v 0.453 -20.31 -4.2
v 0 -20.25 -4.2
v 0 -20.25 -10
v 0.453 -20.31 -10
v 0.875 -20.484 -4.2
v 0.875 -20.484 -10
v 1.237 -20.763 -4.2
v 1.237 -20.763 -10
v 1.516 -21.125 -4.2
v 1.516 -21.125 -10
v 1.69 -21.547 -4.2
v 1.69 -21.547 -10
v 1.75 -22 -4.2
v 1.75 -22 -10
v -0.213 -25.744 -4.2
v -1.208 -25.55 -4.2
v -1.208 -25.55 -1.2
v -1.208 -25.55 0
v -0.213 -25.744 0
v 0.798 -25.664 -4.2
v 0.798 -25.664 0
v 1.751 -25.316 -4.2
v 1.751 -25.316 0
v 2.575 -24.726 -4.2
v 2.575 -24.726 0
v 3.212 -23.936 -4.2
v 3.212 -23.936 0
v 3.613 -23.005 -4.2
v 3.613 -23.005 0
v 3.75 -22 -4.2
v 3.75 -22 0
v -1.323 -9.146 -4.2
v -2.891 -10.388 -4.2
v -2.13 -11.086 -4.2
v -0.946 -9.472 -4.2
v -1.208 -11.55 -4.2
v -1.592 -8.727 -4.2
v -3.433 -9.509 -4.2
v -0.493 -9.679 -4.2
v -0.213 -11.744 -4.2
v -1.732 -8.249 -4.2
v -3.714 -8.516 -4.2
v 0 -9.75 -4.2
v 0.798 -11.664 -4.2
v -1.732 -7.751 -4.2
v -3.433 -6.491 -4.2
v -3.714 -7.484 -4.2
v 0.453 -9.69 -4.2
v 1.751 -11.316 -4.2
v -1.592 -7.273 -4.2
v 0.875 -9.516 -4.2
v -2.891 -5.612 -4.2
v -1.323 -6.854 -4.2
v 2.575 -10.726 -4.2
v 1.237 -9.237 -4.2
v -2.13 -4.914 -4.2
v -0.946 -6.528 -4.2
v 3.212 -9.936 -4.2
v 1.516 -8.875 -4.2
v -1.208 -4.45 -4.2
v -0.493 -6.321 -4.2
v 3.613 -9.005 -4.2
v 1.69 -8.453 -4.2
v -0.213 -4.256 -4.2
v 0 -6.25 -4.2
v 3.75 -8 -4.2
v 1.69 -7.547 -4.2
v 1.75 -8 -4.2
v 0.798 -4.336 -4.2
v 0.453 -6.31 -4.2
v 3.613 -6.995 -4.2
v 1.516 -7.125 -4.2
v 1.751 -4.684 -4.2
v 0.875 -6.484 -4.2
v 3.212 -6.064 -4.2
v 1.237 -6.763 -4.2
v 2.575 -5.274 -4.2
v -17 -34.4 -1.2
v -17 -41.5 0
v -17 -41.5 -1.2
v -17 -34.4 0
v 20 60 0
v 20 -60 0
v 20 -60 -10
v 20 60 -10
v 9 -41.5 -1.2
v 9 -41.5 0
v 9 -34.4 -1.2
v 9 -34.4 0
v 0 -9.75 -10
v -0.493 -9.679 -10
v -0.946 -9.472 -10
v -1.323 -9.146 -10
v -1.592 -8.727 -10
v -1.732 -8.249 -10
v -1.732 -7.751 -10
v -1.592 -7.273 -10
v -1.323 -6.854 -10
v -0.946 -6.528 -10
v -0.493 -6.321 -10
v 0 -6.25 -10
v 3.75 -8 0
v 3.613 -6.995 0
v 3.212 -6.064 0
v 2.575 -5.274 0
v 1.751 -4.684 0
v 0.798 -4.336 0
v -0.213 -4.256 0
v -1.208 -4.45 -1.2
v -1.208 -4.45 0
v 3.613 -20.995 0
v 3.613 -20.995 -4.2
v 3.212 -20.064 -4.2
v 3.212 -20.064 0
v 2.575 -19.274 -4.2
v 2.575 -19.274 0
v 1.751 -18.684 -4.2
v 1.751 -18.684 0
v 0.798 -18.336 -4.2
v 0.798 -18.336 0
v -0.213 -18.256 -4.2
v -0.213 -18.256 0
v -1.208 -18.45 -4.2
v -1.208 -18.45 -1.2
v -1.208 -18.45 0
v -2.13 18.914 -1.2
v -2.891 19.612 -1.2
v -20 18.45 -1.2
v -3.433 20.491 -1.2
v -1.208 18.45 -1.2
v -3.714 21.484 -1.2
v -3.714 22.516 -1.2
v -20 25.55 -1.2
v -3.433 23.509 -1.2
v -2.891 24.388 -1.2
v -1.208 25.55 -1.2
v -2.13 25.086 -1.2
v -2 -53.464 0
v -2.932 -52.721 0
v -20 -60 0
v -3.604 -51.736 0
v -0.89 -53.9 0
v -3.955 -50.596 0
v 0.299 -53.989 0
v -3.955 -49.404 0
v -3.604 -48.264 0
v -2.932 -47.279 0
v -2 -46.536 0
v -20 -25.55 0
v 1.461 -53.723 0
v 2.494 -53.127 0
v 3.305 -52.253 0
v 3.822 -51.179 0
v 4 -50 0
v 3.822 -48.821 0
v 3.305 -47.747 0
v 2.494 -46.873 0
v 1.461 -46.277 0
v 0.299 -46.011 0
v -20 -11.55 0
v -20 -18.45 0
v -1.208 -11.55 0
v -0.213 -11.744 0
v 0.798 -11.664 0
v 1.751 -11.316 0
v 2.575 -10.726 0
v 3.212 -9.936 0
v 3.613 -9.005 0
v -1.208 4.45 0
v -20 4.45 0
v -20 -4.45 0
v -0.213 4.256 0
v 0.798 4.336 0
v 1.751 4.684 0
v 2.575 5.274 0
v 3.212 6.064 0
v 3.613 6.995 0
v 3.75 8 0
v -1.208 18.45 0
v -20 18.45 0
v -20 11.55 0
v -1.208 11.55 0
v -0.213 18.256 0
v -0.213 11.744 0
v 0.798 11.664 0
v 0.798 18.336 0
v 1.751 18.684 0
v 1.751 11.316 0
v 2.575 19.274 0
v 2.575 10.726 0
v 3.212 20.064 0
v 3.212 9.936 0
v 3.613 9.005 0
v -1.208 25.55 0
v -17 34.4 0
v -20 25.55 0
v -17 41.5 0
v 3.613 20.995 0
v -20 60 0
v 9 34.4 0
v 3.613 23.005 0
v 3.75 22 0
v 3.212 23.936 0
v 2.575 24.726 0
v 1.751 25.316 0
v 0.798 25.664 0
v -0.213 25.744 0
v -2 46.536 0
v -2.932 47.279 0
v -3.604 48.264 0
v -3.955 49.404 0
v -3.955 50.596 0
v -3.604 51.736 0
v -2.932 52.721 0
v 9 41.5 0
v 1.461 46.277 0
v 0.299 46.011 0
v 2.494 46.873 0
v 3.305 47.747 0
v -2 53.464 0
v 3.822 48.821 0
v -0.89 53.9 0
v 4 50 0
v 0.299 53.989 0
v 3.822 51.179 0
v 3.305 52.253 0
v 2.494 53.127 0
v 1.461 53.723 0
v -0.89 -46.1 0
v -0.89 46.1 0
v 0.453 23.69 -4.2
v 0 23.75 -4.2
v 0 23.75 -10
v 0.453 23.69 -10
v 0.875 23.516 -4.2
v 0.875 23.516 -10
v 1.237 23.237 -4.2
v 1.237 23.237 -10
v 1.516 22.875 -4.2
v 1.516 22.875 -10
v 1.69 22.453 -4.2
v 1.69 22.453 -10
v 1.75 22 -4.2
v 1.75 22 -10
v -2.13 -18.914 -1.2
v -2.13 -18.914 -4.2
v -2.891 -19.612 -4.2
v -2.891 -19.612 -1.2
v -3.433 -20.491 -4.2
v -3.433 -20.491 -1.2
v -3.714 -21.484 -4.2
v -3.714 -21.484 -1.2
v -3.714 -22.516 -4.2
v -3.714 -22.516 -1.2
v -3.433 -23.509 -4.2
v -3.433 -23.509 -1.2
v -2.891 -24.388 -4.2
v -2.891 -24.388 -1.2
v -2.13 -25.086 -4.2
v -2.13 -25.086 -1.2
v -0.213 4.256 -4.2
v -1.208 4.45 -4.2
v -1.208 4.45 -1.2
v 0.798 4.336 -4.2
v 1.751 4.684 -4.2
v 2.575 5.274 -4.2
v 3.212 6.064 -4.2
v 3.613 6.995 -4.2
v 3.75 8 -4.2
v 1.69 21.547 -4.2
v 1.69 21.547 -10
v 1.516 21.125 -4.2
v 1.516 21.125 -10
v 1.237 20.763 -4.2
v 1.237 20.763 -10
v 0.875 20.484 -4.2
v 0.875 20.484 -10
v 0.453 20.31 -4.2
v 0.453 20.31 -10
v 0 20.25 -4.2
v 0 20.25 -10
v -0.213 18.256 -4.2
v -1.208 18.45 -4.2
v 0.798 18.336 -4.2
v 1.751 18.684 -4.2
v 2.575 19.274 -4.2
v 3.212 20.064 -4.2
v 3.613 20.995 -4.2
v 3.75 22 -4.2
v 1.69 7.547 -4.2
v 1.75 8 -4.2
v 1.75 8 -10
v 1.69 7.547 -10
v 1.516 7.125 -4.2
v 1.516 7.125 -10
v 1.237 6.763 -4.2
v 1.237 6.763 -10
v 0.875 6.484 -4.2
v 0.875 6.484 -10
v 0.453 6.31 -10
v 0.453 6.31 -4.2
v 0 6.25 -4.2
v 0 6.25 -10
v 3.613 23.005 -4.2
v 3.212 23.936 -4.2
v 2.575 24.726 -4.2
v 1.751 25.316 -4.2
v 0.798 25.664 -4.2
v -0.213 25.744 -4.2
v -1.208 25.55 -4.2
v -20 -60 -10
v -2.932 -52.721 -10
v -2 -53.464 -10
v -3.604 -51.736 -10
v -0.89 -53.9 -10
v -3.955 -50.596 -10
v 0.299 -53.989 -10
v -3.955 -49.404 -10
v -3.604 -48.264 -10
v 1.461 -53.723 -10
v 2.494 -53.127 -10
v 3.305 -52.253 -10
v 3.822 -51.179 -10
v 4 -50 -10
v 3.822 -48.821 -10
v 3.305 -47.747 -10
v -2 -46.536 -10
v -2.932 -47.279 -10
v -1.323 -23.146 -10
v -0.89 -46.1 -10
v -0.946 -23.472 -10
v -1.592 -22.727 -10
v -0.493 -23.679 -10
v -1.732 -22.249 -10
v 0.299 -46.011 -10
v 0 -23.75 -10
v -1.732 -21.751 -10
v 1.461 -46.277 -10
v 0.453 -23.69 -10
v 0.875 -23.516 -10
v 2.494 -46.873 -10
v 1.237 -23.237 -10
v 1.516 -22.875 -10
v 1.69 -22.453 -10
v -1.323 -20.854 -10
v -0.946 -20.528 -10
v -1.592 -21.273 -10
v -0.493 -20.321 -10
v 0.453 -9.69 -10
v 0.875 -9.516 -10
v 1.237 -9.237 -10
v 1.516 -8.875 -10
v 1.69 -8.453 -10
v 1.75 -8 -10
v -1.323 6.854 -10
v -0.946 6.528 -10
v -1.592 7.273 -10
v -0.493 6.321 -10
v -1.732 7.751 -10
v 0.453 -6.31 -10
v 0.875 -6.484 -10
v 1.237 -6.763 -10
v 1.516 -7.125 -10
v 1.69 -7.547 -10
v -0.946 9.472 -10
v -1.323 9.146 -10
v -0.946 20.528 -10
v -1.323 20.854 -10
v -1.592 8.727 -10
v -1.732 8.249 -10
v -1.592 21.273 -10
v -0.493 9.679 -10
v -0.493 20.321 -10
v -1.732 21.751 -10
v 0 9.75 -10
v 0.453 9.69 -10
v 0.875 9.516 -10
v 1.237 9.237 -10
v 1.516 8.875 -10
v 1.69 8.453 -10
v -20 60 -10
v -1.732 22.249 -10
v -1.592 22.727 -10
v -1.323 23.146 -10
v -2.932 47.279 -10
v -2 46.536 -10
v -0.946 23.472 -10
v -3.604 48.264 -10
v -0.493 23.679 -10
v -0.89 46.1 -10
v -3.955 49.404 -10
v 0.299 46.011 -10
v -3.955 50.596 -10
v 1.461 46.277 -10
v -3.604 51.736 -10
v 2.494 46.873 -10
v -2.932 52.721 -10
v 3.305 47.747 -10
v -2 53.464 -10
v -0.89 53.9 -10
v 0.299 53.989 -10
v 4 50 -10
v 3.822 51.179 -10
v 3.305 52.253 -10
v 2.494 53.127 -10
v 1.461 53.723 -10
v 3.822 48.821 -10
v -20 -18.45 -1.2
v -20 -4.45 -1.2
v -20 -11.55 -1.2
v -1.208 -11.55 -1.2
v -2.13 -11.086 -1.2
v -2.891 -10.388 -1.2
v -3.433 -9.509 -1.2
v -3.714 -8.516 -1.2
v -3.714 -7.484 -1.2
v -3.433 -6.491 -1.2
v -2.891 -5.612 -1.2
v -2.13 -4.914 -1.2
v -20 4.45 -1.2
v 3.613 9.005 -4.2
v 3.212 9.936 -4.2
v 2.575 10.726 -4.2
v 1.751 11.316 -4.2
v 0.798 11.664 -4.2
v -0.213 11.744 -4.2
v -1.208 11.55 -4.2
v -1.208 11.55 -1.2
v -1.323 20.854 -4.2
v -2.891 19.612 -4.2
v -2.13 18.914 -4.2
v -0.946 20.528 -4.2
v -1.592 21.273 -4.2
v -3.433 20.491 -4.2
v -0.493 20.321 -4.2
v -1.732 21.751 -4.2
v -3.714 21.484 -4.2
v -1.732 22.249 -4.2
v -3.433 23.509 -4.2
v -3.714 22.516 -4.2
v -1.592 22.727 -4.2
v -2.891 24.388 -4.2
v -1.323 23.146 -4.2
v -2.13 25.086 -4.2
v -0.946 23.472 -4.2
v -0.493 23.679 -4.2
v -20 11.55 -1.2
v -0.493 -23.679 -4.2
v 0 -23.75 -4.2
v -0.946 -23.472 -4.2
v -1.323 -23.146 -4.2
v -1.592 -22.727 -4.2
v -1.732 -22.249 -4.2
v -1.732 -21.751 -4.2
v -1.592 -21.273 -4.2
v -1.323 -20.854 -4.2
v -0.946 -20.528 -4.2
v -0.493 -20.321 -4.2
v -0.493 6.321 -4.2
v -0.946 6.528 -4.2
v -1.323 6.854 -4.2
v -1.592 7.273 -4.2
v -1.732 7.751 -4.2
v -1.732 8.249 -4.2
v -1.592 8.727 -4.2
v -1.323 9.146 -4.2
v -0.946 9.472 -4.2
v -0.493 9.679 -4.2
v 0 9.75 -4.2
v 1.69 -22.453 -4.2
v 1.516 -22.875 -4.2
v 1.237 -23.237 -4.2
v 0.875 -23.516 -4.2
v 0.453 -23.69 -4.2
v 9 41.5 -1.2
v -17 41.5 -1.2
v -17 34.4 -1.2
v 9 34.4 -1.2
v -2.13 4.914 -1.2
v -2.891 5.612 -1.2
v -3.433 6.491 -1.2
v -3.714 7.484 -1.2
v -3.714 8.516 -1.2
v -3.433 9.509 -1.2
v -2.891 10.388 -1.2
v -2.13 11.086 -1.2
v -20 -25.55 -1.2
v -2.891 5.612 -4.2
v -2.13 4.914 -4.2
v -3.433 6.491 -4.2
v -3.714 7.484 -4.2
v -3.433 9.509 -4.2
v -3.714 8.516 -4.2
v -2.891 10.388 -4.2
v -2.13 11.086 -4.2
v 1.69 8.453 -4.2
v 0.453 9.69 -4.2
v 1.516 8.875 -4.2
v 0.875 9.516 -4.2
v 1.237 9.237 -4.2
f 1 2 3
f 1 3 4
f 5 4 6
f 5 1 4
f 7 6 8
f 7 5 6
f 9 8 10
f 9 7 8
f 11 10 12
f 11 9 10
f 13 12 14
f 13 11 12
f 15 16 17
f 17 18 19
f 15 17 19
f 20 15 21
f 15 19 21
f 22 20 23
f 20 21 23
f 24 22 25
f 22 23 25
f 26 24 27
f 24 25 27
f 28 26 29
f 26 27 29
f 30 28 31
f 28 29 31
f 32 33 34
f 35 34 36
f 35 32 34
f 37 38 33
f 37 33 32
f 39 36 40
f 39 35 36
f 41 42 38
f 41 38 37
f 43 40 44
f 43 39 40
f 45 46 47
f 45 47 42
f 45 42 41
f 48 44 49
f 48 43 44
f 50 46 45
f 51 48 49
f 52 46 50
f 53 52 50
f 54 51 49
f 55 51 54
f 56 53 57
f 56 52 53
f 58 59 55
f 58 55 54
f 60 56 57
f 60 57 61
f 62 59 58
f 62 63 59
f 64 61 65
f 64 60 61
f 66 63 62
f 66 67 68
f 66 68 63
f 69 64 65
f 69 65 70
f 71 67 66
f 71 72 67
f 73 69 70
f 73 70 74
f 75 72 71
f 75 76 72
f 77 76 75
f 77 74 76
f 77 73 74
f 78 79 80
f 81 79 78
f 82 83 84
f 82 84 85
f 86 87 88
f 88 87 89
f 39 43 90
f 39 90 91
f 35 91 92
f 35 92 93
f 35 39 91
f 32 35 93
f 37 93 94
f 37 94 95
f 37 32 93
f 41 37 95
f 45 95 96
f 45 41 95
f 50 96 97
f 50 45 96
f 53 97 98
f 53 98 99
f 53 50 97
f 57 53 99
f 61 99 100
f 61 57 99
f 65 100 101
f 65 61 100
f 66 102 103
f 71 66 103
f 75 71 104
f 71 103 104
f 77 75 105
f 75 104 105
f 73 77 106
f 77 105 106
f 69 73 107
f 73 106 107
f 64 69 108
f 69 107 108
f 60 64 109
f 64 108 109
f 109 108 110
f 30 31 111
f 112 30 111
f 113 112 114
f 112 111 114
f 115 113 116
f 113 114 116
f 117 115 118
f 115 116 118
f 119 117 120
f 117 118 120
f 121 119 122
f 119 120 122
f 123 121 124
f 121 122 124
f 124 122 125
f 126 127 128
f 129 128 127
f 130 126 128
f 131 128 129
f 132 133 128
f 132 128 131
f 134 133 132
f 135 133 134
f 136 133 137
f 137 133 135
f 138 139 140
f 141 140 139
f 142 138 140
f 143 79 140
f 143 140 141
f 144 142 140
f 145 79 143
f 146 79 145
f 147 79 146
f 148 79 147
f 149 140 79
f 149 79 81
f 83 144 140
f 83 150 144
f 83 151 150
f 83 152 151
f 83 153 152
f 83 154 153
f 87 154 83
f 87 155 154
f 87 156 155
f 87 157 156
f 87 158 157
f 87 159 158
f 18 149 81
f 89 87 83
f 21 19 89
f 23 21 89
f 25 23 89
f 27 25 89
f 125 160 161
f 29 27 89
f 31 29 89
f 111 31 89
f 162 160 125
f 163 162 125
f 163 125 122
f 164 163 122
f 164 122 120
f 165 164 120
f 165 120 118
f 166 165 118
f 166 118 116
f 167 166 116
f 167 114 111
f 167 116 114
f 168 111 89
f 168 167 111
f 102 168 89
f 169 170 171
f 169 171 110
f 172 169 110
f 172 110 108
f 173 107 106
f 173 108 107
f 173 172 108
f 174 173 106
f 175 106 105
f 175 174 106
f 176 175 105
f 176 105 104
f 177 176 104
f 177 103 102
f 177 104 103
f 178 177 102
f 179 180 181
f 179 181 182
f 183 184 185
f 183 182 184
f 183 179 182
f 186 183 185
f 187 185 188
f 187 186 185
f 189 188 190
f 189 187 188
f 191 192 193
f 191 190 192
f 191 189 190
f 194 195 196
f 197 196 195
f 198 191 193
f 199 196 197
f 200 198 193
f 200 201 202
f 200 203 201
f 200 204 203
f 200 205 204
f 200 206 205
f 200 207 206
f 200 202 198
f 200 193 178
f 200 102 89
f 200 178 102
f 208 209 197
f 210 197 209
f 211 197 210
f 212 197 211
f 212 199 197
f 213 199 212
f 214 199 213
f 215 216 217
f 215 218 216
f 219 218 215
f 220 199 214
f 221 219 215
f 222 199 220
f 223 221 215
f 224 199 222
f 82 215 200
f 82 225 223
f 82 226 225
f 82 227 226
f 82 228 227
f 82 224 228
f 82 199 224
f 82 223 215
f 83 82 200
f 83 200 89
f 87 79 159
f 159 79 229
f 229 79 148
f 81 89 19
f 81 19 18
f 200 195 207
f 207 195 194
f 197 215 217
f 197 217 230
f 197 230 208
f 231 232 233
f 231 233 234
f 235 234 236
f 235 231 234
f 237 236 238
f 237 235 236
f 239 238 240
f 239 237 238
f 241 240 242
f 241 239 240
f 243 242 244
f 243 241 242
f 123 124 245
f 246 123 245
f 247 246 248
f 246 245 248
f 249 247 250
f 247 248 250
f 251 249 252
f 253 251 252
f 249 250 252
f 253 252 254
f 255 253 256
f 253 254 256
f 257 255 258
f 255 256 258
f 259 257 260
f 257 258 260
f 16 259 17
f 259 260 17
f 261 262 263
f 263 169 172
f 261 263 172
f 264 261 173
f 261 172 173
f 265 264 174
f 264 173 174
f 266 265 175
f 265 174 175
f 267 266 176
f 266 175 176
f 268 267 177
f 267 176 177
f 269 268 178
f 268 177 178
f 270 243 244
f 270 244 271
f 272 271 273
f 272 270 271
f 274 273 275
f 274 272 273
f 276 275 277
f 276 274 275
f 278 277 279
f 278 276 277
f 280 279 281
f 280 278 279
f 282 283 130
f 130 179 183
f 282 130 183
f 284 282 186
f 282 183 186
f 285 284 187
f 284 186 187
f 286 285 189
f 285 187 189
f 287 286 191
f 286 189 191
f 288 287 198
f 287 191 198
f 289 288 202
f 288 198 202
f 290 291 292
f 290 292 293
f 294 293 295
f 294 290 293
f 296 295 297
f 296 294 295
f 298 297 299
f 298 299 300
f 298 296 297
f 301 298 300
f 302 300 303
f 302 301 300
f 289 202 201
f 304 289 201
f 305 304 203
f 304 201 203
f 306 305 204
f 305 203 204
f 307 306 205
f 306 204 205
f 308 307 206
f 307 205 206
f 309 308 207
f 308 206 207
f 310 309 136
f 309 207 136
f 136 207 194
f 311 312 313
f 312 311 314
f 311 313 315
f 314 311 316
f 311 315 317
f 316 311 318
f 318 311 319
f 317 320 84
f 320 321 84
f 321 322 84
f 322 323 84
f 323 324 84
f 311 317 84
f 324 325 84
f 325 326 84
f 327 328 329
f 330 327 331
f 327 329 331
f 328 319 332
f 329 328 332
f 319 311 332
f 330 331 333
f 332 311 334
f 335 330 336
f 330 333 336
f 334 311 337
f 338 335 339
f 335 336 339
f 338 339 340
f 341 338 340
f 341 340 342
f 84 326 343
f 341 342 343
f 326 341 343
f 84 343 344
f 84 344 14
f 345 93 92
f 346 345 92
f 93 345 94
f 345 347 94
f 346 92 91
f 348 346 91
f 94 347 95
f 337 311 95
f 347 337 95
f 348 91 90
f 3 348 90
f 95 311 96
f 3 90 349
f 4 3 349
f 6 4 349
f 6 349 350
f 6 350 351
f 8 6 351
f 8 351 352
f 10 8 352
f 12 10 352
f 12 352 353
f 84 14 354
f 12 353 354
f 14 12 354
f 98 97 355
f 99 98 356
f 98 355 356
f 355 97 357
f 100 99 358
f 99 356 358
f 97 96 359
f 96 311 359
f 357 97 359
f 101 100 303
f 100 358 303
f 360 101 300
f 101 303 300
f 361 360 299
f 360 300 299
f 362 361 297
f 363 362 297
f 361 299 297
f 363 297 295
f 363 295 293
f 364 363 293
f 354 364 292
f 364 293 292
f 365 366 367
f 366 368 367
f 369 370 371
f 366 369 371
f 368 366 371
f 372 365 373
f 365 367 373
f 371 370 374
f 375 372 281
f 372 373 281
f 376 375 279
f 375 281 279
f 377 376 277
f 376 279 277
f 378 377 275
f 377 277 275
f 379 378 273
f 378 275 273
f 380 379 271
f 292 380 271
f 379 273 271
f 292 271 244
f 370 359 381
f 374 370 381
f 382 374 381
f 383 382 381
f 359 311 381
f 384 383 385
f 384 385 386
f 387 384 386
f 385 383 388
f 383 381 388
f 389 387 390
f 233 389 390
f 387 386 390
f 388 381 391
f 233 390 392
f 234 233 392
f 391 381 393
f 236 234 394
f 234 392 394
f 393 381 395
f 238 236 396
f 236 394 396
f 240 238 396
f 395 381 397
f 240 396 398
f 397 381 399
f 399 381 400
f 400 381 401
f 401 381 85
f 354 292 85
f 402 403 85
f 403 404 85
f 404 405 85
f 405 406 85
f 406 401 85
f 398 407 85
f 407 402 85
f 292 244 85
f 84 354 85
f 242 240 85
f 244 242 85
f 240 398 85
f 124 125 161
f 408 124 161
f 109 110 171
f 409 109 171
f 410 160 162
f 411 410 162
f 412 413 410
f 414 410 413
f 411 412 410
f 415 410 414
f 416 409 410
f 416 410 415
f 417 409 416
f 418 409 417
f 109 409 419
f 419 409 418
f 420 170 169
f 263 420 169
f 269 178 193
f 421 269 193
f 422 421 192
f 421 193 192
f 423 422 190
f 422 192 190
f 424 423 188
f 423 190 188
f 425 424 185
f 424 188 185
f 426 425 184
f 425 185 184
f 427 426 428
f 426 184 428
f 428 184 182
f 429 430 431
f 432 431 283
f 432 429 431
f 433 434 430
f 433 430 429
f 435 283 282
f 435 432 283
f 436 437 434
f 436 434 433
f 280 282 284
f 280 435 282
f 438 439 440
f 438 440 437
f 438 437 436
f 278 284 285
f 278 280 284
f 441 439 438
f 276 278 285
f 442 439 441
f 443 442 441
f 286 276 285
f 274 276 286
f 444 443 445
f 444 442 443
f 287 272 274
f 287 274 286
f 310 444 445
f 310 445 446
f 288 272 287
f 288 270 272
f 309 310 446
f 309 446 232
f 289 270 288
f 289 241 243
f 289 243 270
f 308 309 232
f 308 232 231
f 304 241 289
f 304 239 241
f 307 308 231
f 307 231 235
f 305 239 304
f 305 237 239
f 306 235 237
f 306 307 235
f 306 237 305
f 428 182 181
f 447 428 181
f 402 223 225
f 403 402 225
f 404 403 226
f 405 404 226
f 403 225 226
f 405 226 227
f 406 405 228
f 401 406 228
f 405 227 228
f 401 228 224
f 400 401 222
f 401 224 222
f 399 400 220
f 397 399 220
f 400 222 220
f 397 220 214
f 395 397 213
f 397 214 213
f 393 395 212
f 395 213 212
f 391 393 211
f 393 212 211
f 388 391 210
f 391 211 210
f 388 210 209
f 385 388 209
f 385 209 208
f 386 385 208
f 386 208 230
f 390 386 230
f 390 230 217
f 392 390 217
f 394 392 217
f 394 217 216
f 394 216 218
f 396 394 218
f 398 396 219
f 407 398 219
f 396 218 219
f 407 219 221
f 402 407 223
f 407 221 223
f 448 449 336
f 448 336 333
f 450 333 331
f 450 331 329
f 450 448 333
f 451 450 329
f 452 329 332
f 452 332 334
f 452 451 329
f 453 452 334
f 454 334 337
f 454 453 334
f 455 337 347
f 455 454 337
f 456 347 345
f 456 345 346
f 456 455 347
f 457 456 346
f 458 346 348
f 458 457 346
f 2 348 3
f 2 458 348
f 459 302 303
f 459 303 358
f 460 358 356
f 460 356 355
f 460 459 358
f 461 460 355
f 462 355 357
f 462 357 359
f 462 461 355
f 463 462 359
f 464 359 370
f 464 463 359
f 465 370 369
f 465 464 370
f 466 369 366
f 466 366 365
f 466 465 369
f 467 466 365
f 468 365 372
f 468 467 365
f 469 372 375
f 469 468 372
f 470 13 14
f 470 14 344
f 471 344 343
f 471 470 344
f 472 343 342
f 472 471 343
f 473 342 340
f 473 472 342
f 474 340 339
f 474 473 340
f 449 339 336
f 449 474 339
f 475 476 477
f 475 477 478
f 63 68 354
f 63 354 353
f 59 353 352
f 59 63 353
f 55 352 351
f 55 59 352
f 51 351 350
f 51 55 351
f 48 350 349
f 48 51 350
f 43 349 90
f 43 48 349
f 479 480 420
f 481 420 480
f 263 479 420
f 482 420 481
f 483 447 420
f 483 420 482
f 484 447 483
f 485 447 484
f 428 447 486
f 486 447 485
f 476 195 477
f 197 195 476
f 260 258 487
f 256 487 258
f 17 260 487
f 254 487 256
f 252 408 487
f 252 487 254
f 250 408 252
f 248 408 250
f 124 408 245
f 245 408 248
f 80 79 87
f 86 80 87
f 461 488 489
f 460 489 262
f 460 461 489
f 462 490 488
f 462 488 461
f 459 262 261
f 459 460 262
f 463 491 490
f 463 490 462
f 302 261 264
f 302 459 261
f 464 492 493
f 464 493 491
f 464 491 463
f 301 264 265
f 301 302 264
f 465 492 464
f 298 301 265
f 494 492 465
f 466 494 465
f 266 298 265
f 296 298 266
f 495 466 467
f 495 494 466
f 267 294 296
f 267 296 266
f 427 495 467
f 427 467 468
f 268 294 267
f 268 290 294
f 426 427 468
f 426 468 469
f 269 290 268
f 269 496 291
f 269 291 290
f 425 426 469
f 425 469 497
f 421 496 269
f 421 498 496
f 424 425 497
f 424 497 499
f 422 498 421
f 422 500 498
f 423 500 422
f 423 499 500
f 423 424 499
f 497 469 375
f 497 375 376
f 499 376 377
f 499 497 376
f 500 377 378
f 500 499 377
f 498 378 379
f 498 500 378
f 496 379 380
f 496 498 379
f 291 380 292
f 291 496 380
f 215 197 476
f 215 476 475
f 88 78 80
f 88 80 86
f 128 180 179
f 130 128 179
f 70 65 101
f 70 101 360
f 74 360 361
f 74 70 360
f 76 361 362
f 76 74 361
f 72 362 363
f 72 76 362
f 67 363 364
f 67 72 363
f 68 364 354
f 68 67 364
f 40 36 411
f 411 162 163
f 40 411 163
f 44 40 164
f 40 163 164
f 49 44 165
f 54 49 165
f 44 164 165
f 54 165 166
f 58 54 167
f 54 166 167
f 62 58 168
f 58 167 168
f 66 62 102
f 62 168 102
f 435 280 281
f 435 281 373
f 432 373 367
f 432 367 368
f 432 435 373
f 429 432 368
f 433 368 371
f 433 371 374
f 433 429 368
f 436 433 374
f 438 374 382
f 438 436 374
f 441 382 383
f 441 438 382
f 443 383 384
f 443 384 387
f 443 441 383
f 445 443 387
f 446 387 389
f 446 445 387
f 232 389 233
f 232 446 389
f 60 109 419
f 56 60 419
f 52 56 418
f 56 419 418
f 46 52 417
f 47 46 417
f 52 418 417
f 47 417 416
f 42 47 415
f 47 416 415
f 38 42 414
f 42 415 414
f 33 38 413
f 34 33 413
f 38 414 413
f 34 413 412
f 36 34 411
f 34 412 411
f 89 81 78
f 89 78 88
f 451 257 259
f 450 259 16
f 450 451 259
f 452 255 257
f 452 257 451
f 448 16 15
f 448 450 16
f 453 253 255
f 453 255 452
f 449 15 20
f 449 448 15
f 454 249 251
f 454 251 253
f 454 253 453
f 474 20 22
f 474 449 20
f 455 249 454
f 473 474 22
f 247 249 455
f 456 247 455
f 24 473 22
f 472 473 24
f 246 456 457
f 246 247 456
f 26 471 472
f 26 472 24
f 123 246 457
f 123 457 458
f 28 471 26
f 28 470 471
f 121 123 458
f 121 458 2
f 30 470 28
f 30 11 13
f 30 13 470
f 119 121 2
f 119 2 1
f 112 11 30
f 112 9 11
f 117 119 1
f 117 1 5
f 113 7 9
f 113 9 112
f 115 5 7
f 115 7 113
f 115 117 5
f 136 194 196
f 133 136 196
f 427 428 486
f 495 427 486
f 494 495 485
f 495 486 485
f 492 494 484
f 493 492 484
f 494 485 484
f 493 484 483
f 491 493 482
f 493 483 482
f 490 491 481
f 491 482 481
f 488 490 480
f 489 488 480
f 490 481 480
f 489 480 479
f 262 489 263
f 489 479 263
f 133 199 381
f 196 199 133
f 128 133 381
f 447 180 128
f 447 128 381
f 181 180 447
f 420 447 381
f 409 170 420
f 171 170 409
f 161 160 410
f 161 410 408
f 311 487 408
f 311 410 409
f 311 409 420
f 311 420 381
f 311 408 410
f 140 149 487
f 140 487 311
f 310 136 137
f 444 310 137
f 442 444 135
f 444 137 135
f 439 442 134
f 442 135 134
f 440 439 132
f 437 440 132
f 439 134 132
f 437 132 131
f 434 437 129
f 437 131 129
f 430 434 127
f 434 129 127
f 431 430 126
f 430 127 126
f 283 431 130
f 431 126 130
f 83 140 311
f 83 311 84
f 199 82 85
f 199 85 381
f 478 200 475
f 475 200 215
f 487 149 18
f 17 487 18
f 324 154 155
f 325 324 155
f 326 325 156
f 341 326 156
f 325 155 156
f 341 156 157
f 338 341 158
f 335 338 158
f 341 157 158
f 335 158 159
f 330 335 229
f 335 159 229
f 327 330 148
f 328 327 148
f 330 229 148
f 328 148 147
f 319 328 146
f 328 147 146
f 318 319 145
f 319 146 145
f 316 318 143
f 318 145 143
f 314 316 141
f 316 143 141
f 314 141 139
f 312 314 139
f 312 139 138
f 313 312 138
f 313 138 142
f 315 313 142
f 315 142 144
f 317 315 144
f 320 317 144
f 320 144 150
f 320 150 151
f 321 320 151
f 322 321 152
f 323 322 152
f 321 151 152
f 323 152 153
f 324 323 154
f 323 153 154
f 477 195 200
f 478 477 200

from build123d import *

# Parameters (mm, degrees)
F0_W     = 26
F0_H     = 7.1
F0_R     = 4
F1_DEPTH = 10
F2_DEPTH = 1.2
F3_DEPTH = 4.2


# Not quite as in the source:
# - a feature names something its author has since deleted; it is built from what else it names


with BuildPart() as f1:
    # F0 (on Top) → F1 (new body)
    with BuildSketch(Plane.XY):
        with BuildLine():
            Line((-20, -60), (20, -60))
            Line((20, -60), (20, 60))
            Line((20, 60), (-20, 60))
            Line((-20, 60), (-20, 25.55))
            Line((-20, 25.55), (-1.2083045974, 25.55))
            ThreePointArc((-1.2083045974, 25.55), (2.1830434902, 25.0490688939), (3.75, 22))
            ThreePointArc((3.75, 22), (2.1830434902, 18.9509311061), (-1.2083045974, 18.45))
            Line((-1.2083045974, 18.45), (-20, 18.45))
            Line((-20, 18.45), (-20, 11.55))
            Line((-20, 11.55), (-1.2083045974, 11.55))
            ThreePointArc((-1.2083045974, 11.55), (2.1830434902, 11.0490688939), (3.75, 8))
            ThreePointArc((3.75, 8), (2.1830434902, 4.9509311061), (-1.2083045974, 4.45))
            Line((-1.2083045974, 4.45), (-20, 4.45))
            Line((-20, 4.45), (-20, -4.45))
            Line((-20, -4.45), (-1.2083045974, -4.45))
            ThreePointArc((-1.2083045974, -4.45), (2.1830434902, -4.9509311061), (3.75, -8))
            ThreePointArc((3.75, -8), (2.1830434902, -11.0490688939), (-1.2083045974, -11.55))
            Line((-1.2083045974, -11.55), (-20, -11.55))
            Line((-20, -11.55), (-20, -18.45))
            Line((-20, -18.45), (-1.2083045974, -18.45))
            ThreePointArc((-1.2083045974, -18.45), (2.1830434902, -18.9509311061), (3.75, -22))
            ThreePointArc((3.75, -22), (2.1830434902, -25.0490688939), (-1.2083045974, -25.55))
            Line((-1.2083045974, -25.55), (-20, -25.55))
            Line((-20, -25.55), (-20, -60))
        make_face()
        with Locations((-4, -37.95)):
            Rectangle(F0_W, F0_H, mode=Mode.SUBTRACT)
        with Locations((0, -50)):
            Circle(F0_R, mode=Mode.SUBTRACT)
        with Locations((-4, 37.95)):
            Rectangle(F0_W, F0_H, mode=Mode.SUBTRACT)
        with Locations((0, 50)):
            Circle(F0_R, mode=Mode.SUBTRACT)
        with BuildLine():
            Line((-20, -18.45), (-20, -25.55))
            Line((-20, -25.55), (-1.2083045974, -25.55))
            ThreePointArc((-1.2083045974, -25.55), (-3.75, -22), (-1.2083045974, -18.45))
            Line((-1.2083045974, -18.45), (-20, -18.45))
        make_face()
        with BuildLine():
            Line((-1.2083045974, 25.55), (-20, 25.55))
            Line((-20, 25.55), (-20, 18.45))
            Line((-20, 18.45), (-1.2083045974, 18.45))
            ThreePointArc((-1.2083045974, 18.45), (-3.75, 22), (-1.2083045974, 25.55))
        make_face()
        with BuildLine():
            Line((-20, -4.45), (-20, -11.55))
            Line((-20, -11.55), (-1.2083045974, -11.55))
            ThreePointArc((-1.2083045974, -11.55), (-3.75, -8), (-1.2083045974, -4.45))
            Line((-1.2083045974, -4.45), (-20, -4.45))
        make_face()
        with BuildLine():
            Line((-1.2083045974, 11.55), (-20, 11.55))
            Line((-20, 11.55), (-20, 4.45))
            Line((-20, 4.45), (-1.2083045974, 4.45))
            ThreePointArc((-1.2083045974, 4.45), (-3.75, 8), (-1.2083045974, 11.55))
        make_face()
        with BuildLine():
            Line((0, 25.55), (-1.2083045974, 25.55))
            ThreePointArc((-1.2083045974, 25.55), (-3.75, 22), (-1.2083045974, 18.45))
            Line((-1.2083045974, 18.45), (0, 18.45))
            Line((0, 18.45), (0, 20.25))
            ThreePointArc((0, 20.25), (-1.75, 22), (0, 23.75))
            Line((0, 23.75), (0, 25.55))
        make_face()
        with BuildLine():
            ThreePointArc((3.75, 22), (2.1830434902, 25.0490688939), (-1.2083045974, 25.55))
            Line((-1.2083045974, 25.55), (0, 25.55))
            Line((0, 25.55), (0, 23.75))
            ThreePointArc((0, 23.75), (1.2374368671, 23.2374368671), (1.75, 22))
            ThreePointArc((1.75, 22), (1.2374368671, 20.7625631329), (0, 20.25))
            Line((0, 20.25), (0, 18.45))
            Line((0, 18.45), (-1.2083045974, 18.45))
            ThreePointArc((-1.2083045974, 18.45), (2.1830434902, 18.9509311061), (3.75, 22))
        make_face()
        with BuildLine():
            ThreePointArc((3.75, 8), (2.1830434902, 11.0490688939), (-1.2083045974, 11.55))
            Line((-1.2083045974, 11.55), (0, 11.55))
            Line((0, 11.55), (0, 9.75))
            ThreePointArc((0, 9.75), (1.2374368671, 9.2374368671), (1.75, 8))
            ThreePointArc((1.75, 8), (1.2374368671, 6.7625631329), (0, 6.25))
            Line((0, 6.25), (0, 4.45))
            Line((0, 4.45), (-1.2083045974, 4.45))
            ThreePointArc((-1.2083045974, 4.45), (2.1830434902, 4.9509311061), (3.75, 8))
        make_face()
        with BuildLine():
            Line((0, 11.55), (-1.2083045974, 11.55))
            ThreePointArc((-1.2083045974, 11.55), (-3.75, 8), (-1.2083045974, 4.45))
            Line((-1.2083045974, 4.45), (0, 4.45))
            Line((0, 4.45), (0, 6.25))
            ThreePointArc((0, 6.25), (-1.75, 8), (0, 9.75))
            Line((0, 9.75), (0, 11.55))
        make_face()
        with BuildLine():
            ThreePointArc((-1.2083045974, -4.45), (-3.75, -8), (-1.2083045974, -11.55))
            Line((-1.2083045974, -11.55), (0, -11.55))
            Line((0, -11.55), (0, -9.75))
            ThreePointArc((0, -9.75), (-1.75, -8), (0, -6.25))
            Line((0, -6.25), (0, -4.45))
            Line((0, -4.45), (-1.2083045974, -4.45))
        make_face()
        with BuildLine():
            Line((0, -11.55), (-1.2083045974, -11.55))
            ThreePointArc((-1.2083045974, -11.55), (2.1830434902, -11.0490688939), (3.75, -8))
            ThreePointArc((3.75, -8), (2.1830434902, -4.9509311061), (-1.2083045974, -4.45))
            Line((-1.2083045974, -4.45), (0, -4.45))
            Line((0, -4.45), (0, -6.25))
            ThreePointArc((0, -6.25), (1.2374368671, -6.7625631329), (1.75, -8))
            ThreePointArc((1.75, -8), (1.2374368671, -9.2374368671), (0, -9.75))
            Line((0, -9.75), (0, -11.55))
        make_face()
        with BuildLine():
            Line((0, -25.55), (-1.2083045974, -25.55))
            ThreePointArc((-1.2083045974, -25.55), (2.1830434902, -25.0490688939), (3.75, -22))
            ThreePointArc((3.75, -22), (2.1830434902, -18.9509311061), (-1.2083045974, -18.45))
            Line((-1.2083045974, -18.45), (0, -18.45))
            Line((0, -18.45), (0, -20.25))
            ThreePointArc((0, -20.25), (1.2374368671, -20.7625631329), (1.75, -22))
            ThreePointArc((1.75, -22), (1.2374368671, -23.2374368671), (0, -23.75))
            Line((0, -23.75), (0, -25.55))
        make_face()
        with BuildLine():
            ThreePointArc((-1.2083045974, -18.45), (-3.75, -22), (-1.2083045974, -25.55))
            Line((-1.2083045974, -25.55), (0, -25.55))
            Line((0, -25.55), (0, -23.75))
            ThreePointArc((0, -23.75), (-1.75, -22), (0, -20.25))
            Line((0, -20.25), (0, -18.45))
            Line((0, -18.45), (-1.2083045974, -18.45))
        make_face()
        with Locations((-4, 37.95)):
            Rectangle(F0_W, F0_H)
        with Locations((-4, -37.95)):
            Rectangle(F0_W, F0_H)
    extrude(amount=-F1_DEPTH)

    # F0 (on Top) → F2 (cut)
    with BuildSketch(Plane.XY):
        with BuildLine():
            Line((-1.2083045974, 25.55), (-20, 25.55))
            Line((-20, 25.55), (-20, 18.45))
            Line((-20, 18.45), (-1.2083045974, 18.45))
            ThreePointArc((-1.2083045974, 18.45), (-3.75, 22), (-1.2083045974, 25.55))
        make_face()
        with BuildLine():
            Line((-1.2083045974, 11.55), (-20, 11.55))
            Line((-20, 11.55), (-20, 4.45))
            Line((-20, 4.45), (-1.2083045974, 4.45))
            ThreePointArc((-1.2083045974, 4.45), (-3.75, 8), (-1.2083045974, 11.55))
        make_face()
        with BuildLine():
            Line((-20, -4.45), (-20, -11.55))
            Line((-20, -11.55), (-1.2083045974, -11.55))
            ThreePointArc((-1.2083045974, -11.55), (-3.75, -8), (-1.2083045974, -4.45))
            Line((-1.2083045974, -4.45), (-20, -4.45))
        make_face()
        with BuildLine():
            Line((-20, -18.45), (-20, -25.55))
            Line((-20, -25.55), (-1.2083045974, -25.55))
            ThreePointArc((-1.2083045974, -25.55), (-3.75, -22), (-1.2083045974, -18.45))
            Line((-1.2083045974, -18.45), (-20, -18.45))
        make_face()
        with Locations((-4, 37.95)):
            Rectangle(F0_W, F0_H)
        with Locations((-4, -37.95)):
            Rectangle(F0_W, F0_H)
    extrude(amount=-F2_DEPTH, mode=Mode.SUBTRACT)

    # F0 (on Top) → F3 (cut)
    with BuildSketch(Plane.XY):
        with BuildLine():
            Line((0, 25.55), (-1.2083045974, 25.55))
            ThreePointArc((-1.2083045974, 25.55), (-3.75, 22), (-1.2083045974, 18.45))
            Line((-1.2083045974, 18.45), (0, 18.45))
            Line((0, 18.45), (0, 20.25))
            ThreePointArc((0, 20.25), (-1.75, 22), (0, 23.75))
            Line((0, 23.75), (0, 25.55))
        make_face()
        with BuildLine():
            ThreePointArc((3.75, 22), (2.1830434902, 25.0490688939), (-1.2083045974, 25.55))
            Line((-1.2083045974, 25.55), (0, 25.55))
            Line((0, 25.55), (0, 23.75))
            ThreePointArc((0, 23.75), (1.2374368671, 23.2374368671), (1.75, 22))
            ThreePointArc((1.75, 22), (1.2374368671, 20.7625631329), (0, 20.25))
            Line((0, 20.25), (0, 18.45))
            Line((0, 18.45), (-1.2083045974, 18.45))
            ThreePointArc((-1.2083045974, 18.45), (2.1830434902, 18.9509311061), (3.75, 22))
        make_face()
        with BuildLine():
            Line((0, 11.55), (-1.2083045974, 11.55))
            ThreePointArc((-1.2083045974, 11.55), (-3.75, 8), (-1.2083045974, 4.45))
            Line((-1.2083045974, 4.45), (0, 4.45))
            Line((0, 4.45), (0, 6.25))
            ThreePointArc((0, 6.25), (-1.75, 8), (0, 9.75))
            Line((0, 9.75), (0, 11.55))
        make_face()
        with BuildLine():
            ThreePointArc((3.75, 8), (2.1830434902, 11.0490688939), (-1.2083045974, 11.55))
            Line((-1.2083045974, 11.55), (0, 11.55))
            Line((0, 11.55), (0, 9.75))
            ThreePointArc((0, 9.75), (1.2374368671, 9.2374368671), (1.75, 8))
            ThreePointArc((1.75, 8), (1.2374368671, 6.7625631329), (0, 6.25))
            Line((0, 6.25), (0, 4.45))
            Line((0, 4.45), (-1.2083045974, 4.45))
            ThreePointArc((-1.2083045974, 4.45), (2.1830434902, 4.9509311061), (3.75, 8))
        make_face()
        with BuildLine():
            ThreePointArc((-1.2083045974, -4.45), (-3.75, -8), (-1.2083045974, -11.55))
            Line((-1.2083045974, -11.55), (0, -11.55))
            Line((0, -11.55), (0, -9.75))
            ThreePointArc((0, -9.75), (-1.75, -8), (0, -6.25))
            Line((0, -6.25), (0, -4.45))
            Line((0, -4.45), (-1.2083045974, -4.45))
        make_face()
        with BuildLine():
            Line((0, -11.55), (-1.2083045974, -11.55))
            ThreePointArc((-1.2083045974, -11.55), (2.1830434902, -11.0490688939), (3.75, -8))
            ThreePointArc((3.75, -8), (2.1830434902, -4.9509311061), (-1.2083045974, -4.45))
            Line((-1.2083045974, -4.45), (0, -4.45))
            Line((0, -4.45), (0, -6.25))
            ThreePointArc((0, -6.25), (1.2374368671, -6.7625631329), (1.75, -8))
            ThreePointArc((1.75, -8), (1.2374368671, -9.2374368671), (0, -9.75))
            Line((0, -9.75), (0, -11.55))
        make_face()
        with BuildLine():
            Line((0, -25.55), (-1.2083045974, -25.55))
            ThreePointArc((-1.2083045974, -25.55), (2.1830434902, -25.0490688939), (3.75, -22))
            ThreePointArc((3.75, -22), (2.1830434902, -18.9509311061), (-1.2083045974, -18.45))
            Line((-1.2083045974, -18.45), (0, -18.45))
            Line((0, -18.45), (0, -20.25))
            ThreePointArc((0, -20.25), (1.2374368671, -20.7625631329), (1.75, -22))
            ThreePointArc((1.75, -22), (1.2374368671, -23.2374368671), (0, -23.75))
            Line((0, -23.75), (0, -25.55))
        make_face()
        with BuildLine():
            ThreePointArc((-1.2083045974, -18.45), (-3.75, -22), (-1.2083045974, -25.55))
            Line((-1.2083045974, -25.55), (0, -25.55))
            Line((0, -25.55), (0, -23.75))
            ThreePointArc((0, -23.75), (-1.75, -22), (0, -20.25))
            Line((0, -20.25), (0, -18.45))
            Line((0, -18.45), (-1.2083045974, -18.45))
        make_face()
    extrude(amount=-F3_DEPTH, mode=Mode.SUBTRACT)


solid = f1.part
